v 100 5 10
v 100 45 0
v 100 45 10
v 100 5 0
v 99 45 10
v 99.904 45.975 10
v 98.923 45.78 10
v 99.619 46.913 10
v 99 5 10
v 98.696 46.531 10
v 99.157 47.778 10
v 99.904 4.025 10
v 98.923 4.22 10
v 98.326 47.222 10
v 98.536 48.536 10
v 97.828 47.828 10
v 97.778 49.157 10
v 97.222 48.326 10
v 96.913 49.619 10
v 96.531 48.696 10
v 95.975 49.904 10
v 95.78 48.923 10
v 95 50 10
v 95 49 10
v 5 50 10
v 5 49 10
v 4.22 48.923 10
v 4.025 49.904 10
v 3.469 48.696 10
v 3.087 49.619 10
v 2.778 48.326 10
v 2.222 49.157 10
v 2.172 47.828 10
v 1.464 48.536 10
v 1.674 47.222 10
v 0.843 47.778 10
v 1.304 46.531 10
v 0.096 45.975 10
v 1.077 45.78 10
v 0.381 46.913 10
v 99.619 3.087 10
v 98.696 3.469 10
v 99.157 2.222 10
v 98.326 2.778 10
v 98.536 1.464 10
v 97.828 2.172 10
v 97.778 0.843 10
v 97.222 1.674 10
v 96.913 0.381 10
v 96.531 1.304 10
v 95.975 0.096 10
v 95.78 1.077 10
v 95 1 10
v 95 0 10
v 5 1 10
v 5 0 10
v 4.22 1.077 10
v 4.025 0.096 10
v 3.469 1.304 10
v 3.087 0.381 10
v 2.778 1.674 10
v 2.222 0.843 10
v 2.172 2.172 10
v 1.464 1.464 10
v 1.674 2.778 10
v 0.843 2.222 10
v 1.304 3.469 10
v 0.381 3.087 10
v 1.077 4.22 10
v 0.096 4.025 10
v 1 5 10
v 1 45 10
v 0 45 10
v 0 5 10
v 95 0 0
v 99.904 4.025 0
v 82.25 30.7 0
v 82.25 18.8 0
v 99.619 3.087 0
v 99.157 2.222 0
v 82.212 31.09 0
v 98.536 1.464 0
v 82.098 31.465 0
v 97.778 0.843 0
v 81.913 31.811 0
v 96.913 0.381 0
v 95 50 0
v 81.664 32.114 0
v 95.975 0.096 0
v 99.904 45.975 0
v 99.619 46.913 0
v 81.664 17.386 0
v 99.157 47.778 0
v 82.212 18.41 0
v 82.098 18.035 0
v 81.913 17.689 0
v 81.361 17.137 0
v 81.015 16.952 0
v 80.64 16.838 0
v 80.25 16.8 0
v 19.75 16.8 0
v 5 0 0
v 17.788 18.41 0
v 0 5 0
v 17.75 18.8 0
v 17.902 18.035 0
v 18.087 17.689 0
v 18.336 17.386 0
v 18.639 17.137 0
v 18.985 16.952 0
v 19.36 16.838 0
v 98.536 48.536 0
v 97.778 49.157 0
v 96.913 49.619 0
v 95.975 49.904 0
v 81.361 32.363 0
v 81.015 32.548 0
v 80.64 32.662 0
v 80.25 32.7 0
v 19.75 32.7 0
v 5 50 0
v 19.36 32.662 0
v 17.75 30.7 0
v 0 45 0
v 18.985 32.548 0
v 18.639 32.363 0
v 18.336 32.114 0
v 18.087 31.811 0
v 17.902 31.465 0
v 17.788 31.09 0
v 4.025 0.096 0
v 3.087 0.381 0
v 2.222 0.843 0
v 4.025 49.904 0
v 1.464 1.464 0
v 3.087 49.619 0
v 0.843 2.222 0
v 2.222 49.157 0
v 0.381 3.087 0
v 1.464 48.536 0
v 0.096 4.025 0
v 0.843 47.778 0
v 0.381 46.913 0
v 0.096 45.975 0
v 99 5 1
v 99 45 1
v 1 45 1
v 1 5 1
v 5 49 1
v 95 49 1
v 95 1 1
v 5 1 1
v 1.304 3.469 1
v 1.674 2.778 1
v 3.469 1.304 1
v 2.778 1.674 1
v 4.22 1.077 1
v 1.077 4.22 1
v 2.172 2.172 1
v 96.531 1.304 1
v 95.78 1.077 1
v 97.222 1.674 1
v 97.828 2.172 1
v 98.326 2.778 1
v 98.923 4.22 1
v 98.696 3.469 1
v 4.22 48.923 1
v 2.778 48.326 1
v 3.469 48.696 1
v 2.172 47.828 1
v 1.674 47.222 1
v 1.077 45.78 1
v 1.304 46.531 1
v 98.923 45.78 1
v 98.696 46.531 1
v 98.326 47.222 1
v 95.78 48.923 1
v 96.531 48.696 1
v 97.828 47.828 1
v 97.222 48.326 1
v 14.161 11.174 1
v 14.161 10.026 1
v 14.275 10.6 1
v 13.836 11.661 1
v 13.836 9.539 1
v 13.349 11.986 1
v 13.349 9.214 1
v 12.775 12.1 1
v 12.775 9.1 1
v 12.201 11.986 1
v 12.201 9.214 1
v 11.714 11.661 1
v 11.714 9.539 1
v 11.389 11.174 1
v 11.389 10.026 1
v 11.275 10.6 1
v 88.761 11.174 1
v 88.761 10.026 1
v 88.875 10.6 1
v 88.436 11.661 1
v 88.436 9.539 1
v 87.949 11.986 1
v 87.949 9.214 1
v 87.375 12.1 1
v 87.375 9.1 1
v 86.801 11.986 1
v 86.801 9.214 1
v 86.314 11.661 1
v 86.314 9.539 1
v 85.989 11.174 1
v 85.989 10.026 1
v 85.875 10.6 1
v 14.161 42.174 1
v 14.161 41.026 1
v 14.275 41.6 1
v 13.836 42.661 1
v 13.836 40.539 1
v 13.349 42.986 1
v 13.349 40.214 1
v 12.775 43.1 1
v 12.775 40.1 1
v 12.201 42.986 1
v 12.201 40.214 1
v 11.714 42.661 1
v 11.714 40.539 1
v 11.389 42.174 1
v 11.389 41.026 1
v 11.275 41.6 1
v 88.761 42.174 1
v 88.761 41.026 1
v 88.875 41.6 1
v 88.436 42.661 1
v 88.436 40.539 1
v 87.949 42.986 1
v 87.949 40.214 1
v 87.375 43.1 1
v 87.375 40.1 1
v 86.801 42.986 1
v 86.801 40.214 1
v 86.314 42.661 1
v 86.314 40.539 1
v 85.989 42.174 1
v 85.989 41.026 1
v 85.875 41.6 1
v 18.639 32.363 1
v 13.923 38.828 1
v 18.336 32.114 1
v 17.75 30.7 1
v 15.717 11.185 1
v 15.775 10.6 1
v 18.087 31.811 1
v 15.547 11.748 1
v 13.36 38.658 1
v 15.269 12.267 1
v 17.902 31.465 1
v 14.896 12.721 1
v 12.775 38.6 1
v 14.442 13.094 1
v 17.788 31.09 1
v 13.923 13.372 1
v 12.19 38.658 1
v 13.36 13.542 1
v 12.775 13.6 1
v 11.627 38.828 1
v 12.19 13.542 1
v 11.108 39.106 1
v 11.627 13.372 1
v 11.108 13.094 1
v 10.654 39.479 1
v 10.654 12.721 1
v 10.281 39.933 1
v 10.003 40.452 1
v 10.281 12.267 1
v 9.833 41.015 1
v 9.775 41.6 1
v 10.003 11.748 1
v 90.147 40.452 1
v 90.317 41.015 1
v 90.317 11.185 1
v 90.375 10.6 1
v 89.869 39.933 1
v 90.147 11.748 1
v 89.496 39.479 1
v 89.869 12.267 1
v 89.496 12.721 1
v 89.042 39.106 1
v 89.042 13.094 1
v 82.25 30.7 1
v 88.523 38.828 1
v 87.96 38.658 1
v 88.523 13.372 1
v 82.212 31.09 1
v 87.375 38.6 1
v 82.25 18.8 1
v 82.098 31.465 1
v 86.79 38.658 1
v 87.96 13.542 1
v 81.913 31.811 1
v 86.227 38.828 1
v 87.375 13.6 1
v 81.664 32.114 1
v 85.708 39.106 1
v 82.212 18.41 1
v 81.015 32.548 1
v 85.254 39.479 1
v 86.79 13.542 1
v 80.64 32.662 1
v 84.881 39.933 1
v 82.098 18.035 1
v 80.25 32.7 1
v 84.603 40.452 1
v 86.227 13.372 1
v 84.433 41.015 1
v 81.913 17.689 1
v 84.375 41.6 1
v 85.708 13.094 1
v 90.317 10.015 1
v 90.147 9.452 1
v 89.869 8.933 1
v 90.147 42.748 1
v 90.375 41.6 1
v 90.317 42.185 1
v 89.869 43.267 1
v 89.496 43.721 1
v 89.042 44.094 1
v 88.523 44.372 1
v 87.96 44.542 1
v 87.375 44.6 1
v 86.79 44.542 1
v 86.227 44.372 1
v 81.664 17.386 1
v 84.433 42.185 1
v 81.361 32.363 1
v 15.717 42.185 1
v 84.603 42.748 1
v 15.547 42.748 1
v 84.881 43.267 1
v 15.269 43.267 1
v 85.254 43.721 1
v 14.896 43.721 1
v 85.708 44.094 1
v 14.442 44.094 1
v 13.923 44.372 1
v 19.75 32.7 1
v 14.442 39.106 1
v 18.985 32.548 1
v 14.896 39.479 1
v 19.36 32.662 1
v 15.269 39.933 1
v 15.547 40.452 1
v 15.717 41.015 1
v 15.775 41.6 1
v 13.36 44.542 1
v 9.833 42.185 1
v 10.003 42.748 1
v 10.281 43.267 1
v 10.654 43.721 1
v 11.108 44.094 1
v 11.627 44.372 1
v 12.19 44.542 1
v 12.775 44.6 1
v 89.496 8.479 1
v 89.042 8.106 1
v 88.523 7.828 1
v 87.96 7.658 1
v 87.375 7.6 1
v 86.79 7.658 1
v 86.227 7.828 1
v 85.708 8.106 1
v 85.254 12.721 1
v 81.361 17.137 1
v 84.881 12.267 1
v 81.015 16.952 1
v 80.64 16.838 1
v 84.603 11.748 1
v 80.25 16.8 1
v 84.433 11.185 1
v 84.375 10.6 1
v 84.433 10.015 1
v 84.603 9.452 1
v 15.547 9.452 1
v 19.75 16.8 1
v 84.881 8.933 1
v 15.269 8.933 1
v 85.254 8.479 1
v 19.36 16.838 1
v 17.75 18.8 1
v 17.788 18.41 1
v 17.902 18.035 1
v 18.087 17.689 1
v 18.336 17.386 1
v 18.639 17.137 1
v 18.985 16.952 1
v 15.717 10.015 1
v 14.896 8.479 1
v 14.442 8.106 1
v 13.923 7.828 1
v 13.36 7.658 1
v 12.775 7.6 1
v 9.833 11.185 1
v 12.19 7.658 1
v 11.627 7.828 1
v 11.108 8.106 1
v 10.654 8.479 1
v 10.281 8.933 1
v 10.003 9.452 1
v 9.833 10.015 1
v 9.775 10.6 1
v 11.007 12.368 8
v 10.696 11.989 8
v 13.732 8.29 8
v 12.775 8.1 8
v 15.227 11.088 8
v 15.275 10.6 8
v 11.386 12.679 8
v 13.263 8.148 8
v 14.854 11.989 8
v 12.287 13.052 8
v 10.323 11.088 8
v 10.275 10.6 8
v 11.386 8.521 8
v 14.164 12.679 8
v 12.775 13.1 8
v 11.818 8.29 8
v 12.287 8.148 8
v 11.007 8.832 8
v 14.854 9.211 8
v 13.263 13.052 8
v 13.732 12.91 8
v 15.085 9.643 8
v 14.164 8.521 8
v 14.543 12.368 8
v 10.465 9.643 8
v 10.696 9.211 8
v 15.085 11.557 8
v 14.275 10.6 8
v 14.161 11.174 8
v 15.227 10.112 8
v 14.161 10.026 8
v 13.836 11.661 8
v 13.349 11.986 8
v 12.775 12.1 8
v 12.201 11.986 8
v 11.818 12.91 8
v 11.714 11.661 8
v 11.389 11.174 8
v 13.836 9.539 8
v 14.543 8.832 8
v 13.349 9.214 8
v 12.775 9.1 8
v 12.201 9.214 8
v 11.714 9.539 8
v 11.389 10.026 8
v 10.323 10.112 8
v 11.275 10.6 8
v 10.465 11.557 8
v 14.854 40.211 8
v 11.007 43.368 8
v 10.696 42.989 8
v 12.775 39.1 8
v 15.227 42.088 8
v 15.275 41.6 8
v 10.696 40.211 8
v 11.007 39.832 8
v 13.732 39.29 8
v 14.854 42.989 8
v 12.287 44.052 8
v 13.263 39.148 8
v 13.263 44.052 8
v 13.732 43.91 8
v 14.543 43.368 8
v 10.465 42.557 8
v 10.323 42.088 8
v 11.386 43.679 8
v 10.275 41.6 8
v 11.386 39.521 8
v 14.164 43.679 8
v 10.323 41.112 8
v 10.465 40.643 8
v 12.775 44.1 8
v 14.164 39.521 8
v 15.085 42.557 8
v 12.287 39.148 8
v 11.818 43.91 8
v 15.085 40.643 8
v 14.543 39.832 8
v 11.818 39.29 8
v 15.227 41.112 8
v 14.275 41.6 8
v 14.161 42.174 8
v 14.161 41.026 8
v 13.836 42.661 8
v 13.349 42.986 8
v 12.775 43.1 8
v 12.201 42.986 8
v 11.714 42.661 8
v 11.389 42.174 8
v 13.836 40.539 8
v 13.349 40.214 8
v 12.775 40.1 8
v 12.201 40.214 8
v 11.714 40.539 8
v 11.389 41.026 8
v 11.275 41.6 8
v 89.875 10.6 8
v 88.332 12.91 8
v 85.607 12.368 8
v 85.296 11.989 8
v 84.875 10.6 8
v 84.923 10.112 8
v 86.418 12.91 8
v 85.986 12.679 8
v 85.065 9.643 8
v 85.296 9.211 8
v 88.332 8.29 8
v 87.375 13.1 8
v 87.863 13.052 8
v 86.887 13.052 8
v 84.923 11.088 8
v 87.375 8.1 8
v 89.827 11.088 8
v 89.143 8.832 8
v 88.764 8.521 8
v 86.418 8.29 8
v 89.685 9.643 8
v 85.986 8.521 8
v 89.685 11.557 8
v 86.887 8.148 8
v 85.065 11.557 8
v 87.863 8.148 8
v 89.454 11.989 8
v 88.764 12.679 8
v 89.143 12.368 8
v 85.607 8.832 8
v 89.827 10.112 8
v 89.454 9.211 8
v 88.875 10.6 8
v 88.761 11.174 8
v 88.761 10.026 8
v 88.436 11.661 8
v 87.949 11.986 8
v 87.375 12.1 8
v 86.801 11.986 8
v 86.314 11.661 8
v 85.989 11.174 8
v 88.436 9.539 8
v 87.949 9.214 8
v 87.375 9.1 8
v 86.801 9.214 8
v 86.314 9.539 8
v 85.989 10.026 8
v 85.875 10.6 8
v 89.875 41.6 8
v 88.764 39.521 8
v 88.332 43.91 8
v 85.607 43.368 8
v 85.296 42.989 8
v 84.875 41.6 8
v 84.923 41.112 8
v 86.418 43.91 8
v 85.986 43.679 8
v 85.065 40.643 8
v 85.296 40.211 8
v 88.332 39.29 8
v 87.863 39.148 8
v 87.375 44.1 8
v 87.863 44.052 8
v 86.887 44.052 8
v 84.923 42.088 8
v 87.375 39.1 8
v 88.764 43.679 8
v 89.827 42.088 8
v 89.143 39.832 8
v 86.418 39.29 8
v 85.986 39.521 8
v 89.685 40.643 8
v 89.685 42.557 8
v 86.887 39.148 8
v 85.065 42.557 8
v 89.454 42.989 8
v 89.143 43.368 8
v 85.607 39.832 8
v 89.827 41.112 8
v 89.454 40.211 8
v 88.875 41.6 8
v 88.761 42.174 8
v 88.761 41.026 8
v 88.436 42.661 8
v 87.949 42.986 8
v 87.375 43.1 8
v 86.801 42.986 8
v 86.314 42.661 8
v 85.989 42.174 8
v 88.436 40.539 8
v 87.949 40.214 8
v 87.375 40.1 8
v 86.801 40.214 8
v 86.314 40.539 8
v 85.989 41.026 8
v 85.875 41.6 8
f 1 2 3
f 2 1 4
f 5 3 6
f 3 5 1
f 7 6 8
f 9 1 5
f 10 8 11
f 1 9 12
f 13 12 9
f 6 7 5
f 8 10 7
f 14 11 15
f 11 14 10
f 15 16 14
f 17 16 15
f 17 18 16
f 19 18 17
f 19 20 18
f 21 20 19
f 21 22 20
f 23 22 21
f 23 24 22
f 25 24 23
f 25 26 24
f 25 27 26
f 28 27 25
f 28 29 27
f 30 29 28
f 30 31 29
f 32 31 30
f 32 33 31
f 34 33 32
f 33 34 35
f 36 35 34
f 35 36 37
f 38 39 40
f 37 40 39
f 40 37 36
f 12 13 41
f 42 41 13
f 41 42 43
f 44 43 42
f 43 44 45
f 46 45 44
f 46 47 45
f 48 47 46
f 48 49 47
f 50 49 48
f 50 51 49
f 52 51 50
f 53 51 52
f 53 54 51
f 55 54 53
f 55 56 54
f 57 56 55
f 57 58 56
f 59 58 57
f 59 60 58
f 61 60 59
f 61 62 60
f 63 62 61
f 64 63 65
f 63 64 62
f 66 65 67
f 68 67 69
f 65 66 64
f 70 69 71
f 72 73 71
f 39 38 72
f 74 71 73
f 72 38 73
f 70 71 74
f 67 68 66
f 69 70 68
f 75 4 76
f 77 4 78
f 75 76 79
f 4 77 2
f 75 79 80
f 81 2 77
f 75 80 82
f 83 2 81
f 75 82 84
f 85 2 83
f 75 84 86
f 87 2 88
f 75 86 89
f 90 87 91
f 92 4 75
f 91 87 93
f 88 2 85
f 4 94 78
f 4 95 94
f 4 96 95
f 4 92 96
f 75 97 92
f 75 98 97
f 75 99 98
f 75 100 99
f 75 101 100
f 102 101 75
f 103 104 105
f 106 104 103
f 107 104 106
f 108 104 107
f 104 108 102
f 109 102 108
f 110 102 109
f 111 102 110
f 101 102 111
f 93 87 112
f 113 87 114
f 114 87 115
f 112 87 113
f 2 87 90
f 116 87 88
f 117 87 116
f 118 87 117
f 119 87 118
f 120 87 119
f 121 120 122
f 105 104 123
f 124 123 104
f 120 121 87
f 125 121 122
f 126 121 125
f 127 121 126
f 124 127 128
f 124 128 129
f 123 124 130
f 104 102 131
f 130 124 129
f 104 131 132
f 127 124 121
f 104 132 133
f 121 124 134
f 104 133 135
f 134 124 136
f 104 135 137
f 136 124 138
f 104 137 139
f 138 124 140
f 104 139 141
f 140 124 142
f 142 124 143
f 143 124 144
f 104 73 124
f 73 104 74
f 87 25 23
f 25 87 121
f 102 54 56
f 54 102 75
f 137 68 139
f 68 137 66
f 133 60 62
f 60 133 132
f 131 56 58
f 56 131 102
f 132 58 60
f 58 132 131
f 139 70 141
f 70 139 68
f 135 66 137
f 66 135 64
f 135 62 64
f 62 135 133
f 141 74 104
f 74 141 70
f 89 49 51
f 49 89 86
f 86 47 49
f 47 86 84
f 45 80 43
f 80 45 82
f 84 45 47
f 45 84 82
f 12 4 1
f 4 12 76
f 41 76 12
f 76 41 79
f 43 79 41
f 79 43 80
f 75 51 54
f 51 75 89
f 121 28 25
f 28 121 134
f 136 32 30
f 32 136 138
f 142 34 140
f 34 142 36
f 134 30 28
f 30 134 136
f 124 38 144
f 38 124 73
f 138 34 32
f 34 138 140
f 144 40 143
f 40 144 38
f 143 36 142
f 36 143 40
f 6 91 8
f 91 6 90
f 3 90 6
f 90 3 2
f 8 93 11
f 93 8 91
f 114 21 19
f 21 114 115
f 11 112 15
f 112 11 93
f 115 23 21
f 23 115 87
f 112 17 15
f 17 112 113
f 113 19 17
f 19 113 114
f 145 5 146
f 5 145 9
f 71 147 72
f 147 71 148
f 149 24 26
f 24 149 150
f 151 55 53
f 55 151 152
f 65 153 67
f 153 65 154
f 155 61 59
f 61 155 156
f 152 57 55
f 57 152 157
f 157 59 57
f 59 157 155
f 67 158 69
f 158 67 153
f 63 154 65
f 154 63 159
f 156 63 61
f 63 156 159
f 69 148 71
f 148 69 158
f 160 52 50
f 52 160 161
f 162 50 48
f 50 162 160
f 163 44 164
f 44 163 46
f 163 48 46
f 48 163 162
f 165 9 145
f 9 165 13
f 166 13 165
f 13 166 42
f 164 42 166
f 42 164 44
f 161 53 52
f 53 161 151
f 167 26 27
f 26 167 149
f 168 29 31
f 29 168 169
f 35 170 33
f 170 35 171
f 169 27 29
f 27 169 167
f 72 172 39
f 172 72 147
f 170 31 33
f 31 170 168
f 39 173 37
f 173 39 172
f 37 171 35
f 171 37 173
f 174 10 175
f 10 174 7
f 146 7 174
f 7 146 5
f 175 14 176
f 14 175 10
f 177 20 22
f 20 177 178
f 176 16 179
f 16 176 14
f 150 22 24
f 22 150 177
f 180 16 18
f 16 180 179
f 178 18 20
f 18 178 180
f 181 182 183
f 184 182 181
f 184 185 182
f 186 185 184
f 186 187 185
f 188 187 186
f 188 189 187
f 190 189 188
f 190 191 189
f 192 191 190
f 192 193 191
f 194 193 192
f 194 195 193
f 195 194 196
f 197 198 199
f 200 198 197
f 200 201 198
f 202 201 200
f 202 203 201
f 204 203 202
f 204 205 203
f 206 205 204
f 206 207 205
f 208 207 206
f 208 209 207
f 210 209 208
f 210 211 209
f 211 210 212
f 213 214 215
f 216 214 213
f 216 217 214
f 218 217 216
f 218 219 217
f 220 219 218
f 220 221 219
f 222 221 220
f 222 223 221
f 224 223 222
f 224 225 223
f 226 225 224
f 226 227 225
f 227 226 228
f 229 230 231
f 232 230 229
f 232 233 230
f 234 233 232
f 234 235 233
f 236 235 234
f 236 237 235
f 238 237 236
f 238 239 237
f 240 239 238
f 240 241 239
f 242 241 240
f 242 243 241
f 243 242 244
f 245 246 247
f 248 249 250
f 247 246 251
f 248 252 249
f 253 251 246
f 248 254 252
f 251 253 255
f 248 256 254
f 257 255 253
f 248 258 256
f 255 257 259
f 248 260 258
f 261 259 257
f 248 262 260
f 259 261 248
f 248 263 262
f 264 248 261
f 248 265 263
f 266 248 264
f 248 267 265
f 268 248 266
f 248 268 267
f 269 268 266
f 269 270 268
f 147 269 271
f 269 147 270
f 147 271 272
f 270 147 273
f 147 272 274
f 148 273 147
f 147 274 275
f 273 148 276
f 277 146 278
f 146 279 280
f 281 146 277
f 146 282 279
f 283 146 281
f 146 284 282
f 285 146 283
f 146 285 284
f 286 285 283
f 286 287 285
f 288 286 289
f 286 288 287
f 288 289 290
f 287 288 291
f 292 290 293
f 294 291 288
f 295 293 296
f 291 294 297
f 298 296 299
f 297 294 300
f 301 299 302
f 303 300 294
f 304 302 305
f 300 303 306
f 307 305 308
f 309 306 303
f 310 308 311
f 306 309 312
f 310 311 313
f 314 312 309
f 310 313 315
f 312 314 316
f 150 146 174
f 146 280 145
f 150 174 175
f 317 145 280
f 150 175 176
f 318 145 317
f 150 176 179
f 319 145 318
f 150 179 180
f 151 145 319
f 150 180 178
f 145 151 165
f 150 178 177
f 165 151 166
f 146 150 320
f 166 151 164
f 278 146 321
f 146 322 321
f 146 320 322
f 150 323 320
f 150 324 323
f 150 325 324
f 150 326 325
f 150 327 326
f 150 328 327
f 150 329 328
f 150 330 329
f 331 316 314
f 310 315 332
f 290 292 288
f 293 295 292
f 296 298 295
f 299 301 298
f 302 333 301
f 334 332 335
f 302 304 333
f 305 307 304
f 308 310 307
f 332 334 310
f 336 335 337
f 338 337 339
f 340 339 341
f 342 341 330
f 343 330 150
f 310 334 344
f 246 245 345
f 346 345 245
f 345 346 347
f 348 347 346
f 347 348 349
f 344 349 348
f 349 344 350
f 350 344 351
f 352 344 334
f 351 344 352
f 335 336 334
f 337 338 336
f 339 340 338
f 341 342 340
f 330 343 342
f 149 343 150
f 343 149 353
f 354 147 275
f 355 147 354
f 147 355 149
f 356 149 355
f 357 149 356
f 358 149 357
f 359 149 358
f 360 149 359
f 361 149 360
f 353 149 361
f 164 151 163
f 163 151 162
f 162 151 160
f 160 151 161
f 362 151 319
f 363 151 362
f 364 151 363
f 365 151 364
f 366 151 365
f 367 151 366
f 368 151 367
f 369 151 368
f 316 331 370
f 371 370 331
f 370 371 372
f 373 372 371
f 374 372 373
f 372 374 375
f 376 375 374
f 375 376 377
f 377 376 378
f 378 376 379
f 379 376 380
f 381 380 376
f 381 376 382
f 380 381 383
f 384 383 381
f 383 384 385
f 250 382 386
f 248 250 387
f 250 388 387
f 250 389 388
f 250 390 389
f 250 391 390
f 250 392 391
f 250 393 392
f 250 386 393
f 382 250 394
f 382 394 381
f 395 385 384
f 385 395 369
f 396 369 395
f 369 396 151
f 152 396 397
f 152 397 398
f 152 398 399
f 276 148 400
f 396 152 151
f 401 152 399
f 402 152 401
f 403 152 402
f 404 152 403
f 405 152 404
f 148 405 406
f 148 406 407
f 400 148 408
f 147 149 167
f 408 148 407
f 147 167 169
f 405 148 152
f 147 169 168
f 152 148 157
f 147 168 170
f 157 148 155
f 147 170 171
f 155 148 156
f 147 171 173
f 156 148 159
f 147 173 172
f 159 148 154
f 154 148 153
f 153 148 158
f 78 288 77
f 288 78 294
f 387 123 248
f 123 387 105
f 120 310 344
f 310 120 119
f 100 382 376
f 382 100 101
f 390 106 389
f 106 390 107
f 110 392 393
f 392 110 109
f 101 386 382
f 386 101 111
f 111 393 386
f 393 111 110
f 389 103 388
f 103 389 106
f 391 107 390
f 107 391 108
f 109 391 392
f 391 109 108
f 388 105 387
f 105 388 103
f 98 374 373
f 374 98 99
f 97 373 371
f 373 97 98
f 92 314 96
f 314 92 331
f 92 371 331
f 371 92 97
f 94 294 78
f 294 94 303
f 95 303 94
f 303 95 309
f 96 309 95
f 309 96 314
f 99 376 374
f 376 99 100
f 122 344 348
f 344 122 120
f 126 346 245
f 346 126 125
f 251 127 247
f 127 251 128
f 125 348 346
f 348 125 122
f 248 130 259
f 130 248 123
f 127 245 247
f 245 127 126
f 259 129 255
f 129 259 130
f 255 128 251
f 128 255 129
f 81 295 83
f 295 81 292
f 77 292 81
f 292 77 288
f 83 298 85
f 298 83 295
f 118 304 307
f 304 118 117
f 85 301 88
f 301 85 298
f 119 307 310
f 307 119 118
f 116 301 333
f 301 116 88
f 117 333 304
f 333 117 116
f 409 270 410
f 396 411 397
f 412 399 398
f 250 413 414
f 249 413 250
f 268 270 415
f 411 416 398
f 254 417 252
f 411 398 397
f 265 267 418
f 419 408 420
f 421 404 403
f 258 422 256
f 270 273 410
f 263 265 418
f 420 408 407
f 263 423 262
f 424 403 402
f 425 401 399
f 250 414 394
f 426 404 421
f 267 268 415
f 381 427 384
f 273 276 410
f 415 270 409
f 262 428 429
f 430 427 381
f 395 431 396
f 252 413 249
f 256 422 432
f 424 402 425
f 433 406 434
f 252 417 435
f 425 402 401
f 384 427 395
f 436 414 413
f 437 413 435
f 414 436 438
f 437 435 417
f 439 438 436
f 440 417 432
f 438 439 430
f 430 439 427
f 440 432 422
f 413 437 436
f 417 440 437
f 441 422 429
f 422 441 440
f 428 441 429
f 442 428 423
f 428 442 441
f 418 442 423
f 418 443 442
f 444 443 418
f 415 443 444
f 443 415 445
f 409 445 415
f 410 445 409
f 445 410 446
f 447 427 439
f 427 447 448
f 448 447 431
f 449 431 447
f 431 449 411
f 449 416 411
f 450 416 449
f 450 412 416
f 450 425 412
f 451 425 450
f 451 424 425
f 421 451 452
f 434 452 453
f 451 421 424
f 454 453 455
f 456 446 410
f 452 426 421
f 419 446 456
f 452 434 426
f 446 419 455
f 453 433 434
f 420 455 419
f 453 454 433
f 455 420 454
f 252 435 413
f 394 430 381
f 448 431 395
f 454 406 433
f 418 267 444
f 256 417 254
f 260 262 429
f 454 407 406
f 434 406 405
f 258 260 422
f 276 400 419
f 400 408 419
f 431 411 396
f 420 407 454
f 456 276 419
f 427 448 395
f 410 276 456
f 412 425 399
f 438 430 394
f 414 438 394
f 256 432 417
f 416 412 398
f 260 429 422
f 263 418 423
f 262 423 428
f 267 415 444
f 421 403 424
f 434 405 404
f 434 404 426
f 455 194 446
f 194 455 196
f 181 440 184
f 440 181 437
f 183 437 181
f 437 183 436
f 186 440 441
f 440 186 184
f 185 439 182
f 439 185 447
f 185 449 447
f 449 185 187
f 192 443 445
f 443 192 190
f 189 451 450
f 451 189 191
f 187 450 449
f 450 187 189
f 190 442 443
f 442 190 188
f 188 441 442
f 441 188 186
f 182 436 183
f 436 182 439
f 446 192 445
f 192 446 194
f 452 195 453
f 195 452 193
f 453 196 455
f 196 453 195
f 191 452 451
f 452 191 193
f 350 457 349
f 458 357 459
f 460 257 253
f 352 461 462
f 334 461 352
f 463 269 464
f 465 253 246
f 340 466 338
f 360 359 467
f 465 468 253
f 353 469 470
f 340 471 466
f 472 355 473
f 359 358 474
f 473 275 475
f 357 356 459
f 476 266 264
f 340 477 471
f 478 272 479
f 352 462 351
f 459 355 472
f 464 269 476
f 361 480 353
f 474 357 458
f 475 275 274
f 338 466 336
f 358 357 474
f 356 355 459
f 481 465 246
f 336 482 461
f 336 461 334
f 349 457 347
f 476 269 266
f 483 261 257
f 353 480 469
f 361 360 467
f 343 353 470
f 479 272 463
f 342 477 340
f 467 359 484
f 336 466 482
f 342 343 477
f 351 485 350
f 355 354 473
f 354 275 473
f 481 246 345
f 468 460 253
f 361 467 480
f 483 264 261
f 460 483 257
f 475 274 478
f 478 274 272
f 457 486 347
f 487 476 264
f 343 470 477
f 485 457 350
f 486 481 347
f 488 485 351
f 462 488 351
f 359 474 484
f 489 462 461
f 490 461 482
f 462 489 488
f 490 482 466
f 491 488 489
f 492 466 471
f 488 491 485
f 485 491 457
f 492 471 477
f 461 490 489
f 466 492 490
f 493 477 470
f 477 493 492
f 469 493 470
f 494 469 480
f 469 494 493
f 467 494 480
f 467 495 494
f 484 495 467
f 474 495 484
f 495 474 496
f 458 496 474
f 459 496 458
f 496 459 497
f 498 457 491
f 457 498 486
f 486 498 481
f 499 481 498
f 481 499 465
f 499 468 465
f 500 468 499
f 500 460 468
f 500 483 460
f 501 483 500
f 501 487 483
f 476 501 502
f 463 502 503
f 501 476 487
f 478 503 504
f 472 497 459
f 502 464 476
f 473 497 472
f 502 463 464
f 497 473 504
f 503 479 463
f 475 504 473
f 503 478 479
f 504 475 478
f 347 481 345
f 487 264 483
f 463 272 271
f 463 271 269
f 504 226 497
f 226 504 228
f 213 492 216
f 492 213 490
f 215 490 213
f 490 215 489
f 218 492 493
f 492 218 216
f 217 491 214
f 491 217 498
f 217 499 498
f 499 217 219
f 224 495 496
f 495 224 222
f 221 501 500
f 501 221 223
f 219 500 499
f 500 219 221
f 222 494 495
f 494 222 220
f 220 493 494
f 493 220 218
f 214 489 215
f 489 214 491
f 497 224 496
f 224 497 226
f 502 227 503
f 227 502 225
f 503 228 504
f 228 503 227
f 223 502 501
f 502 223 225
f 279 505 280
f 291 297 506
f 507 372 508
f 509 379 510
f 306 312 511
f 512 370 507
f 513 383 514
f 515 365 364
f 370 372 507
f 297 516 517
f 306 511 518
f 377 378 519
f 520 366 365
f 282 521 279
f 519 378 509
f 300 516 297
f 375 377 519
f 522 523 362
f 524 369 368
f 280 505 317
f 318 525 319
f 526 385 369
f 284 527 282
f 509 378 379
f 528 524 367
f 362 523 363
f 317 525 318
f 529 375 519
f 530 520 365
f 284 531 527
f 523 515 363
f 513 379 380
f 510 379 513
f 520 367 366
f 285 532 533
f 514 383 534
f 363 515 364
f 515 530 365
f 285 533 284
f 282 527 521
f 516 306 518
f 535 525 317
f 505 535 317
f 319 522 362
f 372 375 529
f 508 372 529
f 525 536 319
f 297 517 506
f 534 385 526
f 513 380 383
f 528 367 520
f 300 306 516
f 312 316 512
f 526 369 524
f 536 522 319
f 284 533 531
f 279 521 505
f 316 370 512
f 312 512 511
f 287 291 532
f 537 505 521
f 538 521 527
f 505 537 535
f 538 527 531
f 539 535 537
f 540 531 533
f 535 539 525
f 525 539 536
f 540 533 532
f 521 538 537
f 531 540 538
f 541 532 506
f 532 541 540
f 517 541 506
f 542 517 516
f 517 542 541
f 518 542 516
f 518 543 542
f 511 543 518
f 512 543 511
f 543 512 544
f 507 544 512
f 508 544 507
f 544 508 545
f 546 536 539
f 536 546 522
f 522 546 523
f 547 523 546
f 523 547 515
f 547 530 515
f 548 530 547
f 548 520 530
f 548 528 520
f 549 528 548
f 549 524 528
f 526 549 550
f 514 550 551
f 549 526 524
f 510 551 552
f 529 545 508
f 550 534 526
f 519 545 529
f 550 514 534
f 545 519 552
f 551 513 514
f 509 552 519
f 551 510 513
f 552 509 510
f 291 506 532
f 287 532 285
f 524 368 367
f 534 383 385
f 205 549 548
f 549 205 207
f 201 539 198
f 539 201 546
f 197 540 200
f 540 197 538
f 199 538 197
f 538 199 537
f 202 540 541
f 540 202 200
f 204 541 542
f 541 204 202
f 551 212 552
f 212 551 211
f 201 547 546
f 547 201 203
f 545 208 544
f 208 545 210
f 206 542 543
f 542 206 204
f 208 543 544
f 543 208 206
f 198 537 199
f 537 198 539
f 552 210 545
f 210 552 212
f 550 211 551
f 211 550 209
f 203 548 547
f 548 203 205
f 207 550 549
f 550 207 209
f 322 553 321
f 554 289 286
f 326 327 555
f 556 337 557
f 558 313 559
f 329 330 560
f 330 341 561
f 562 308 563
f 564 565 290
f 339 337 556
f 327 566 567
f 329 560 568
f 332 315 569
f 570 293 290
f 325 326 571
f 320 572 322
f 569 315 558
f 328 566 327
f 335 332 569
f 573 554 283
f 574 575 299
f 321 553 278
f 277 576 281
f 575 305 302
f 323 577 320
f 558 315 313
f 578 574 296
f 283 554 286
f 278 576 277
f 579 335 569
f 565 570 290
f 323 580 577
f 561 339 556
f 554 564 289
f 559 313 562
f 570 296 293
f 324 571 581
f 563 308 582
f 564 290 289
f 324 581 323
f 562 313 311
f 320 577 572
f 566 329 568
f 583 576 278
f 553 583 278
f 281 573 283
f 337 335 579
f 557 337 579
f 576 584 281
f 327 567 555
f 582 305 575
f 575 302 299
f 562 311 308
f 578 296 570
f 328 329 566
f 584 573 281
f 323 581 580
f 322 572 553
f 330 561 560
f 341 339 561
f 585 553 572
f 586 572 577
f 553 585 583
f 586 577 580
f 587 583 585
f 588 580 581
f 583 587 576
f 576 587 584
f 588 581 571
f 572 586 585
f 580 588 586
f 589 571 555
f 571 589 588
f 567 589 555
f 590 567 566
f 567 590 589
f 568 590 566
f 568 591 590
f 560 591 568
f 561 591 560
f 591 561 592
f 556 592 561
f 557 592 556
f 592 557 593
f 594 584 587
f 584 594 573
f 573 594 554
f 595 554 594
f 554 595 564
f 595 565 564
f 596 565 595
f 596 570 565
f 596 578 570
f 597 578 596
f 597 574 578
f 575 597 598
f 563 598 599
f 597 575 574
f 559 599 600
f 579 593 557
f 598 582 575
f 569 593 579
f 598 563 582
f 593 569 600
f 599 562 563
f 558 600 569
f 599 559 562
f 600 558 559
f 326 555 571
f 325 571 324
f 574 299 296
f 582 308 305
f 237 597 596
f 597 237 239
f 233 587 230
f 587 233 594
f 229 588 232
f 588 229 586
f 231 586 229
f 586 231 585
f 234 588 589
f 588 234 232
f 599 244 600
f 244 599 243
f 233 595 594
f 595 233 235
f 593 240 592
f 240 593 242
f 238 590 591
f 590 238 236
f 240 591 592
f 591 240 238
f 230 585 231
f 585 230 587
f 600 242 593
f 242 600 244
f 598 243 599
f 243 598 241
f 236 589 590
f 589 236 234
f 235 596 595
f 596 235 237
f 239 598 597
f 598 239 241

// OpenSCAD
// [FL_INDEX: keywords="openscad, 3d_parametric, Parametric_LCD_bezel_with_rounded_corners, csg_solid" | COT="Parametric OpenSCAD design from 3DCodeverse"]
// Title: Parametric LCD bezel with rounded corners

//base plate
size_x=100;
size_y=50;
size_z=1;
corner_radius=5;
corner_faces=32;

//cutout
cutout_corner_radius=2;
cutout_corner_faces=32;
offset_x=10;
offset_y=8;

//rim
rim_height=10;

module plate (sizeX, sizeY, sizeZ, cornerRadius, cornerFaces)
{
	union()
	{
		difference()
		{
			cube([sizeX,sizeY,sizeZ]);		
			cube([cornerRadius,cornerRadius,	sizeZ+1]);
			translate([sizeX-cornerRadius,0,0]) cube([cornerRadius,cornerRadius,sizeZ+1]);
			translate([0,sizeY-cornerRadius,0]) cube([cornerRadius,cornerRadius,sizeZ+1]);
			translate([sizeX-cornerRadius,sizeY-cornerRadius,0]) cube([cornerRadius,cornerRadius,sizeZ+1]);
		}
		translate([cornerRadius,cornerRadius,0]) cylinder(r=cornerRadius,h=sizeZ, $fn=cornerFaces);
		translate([sizeX-cornerRadius,cornerRadius,0]) cylinder(r=cornerRadius,h=sizeZ, $fn=cornerFaces);
		translate([cornerRadius,sizeY-cornerRadius,0]) cylinder(r=cornerRadius,h=sizeZ, $fn=cornerFaces);
		translate([sizeX-cornerRadius,sizeY-cornerRadius,0]) cylinder(r=cornerRadius,h=sizeZ, $fn=cornerFaces);
	}
}

module posts()
{

	union()
	{
		difference()
		{
			translate([0+2.775,0+2.6,size_z]) cylinder(r1=6/2, r2=5/2,h=7, $fn=32);	
			translate([0+2.775,0+2.6,size_z]) cylinder(r=3/2,h=7.5, $fn=16);
		}
		difference()
		{
			translate([0+2.775,31+2.6,size_z]) cylinder(r1=6/2, r2=5/2,h=7, $fn=32);
			translate([0+2.775,31+2.6,size_z]) cylinder(r=3/2,h=7.5, $fn=16);
		}

		difference()
		{
			translate([74.60+2.775,0+2.6,size_z]) cylinder(r1=6/2, r2=5/2,h=7, $fn=32);
			translate([74.60+2.775,0+2.6,size_z]) cylinder(r=3/2,h=7.5, $fn=16);
		}	

		difference()
		{
			translate([74.60+2.775,31+2.6,size_z]) cylinder(r1=6/2, r2=5/2,h=7, $fn=32);
			translate([74.60+2.775,31+2.6,size_z]) cylinder(r=3/2,h=7.5, $fn=16);
		}
	}
}


difference()
{
plate (size_x, size_y,rim_height, corner_radius, corner_faces);
translate([size_z,size_z,0])
plate (size_x-(2*size_z), size_y-(2*size_z),rim_height, corner_radius-size_z, corner_faces);
}

union()
{
difference()
{
//base plate
plate (size_x, size_y, size_z, corner_radius, corner_faces);

//display cutout
translate([7.75+offset_x,8.8+offset_y,0])
plate(64.5,15.9,10,cutout_corner_radius,cutout_corner_faces);

}
translate([offset_x,offset_y,0])
posts();
}
